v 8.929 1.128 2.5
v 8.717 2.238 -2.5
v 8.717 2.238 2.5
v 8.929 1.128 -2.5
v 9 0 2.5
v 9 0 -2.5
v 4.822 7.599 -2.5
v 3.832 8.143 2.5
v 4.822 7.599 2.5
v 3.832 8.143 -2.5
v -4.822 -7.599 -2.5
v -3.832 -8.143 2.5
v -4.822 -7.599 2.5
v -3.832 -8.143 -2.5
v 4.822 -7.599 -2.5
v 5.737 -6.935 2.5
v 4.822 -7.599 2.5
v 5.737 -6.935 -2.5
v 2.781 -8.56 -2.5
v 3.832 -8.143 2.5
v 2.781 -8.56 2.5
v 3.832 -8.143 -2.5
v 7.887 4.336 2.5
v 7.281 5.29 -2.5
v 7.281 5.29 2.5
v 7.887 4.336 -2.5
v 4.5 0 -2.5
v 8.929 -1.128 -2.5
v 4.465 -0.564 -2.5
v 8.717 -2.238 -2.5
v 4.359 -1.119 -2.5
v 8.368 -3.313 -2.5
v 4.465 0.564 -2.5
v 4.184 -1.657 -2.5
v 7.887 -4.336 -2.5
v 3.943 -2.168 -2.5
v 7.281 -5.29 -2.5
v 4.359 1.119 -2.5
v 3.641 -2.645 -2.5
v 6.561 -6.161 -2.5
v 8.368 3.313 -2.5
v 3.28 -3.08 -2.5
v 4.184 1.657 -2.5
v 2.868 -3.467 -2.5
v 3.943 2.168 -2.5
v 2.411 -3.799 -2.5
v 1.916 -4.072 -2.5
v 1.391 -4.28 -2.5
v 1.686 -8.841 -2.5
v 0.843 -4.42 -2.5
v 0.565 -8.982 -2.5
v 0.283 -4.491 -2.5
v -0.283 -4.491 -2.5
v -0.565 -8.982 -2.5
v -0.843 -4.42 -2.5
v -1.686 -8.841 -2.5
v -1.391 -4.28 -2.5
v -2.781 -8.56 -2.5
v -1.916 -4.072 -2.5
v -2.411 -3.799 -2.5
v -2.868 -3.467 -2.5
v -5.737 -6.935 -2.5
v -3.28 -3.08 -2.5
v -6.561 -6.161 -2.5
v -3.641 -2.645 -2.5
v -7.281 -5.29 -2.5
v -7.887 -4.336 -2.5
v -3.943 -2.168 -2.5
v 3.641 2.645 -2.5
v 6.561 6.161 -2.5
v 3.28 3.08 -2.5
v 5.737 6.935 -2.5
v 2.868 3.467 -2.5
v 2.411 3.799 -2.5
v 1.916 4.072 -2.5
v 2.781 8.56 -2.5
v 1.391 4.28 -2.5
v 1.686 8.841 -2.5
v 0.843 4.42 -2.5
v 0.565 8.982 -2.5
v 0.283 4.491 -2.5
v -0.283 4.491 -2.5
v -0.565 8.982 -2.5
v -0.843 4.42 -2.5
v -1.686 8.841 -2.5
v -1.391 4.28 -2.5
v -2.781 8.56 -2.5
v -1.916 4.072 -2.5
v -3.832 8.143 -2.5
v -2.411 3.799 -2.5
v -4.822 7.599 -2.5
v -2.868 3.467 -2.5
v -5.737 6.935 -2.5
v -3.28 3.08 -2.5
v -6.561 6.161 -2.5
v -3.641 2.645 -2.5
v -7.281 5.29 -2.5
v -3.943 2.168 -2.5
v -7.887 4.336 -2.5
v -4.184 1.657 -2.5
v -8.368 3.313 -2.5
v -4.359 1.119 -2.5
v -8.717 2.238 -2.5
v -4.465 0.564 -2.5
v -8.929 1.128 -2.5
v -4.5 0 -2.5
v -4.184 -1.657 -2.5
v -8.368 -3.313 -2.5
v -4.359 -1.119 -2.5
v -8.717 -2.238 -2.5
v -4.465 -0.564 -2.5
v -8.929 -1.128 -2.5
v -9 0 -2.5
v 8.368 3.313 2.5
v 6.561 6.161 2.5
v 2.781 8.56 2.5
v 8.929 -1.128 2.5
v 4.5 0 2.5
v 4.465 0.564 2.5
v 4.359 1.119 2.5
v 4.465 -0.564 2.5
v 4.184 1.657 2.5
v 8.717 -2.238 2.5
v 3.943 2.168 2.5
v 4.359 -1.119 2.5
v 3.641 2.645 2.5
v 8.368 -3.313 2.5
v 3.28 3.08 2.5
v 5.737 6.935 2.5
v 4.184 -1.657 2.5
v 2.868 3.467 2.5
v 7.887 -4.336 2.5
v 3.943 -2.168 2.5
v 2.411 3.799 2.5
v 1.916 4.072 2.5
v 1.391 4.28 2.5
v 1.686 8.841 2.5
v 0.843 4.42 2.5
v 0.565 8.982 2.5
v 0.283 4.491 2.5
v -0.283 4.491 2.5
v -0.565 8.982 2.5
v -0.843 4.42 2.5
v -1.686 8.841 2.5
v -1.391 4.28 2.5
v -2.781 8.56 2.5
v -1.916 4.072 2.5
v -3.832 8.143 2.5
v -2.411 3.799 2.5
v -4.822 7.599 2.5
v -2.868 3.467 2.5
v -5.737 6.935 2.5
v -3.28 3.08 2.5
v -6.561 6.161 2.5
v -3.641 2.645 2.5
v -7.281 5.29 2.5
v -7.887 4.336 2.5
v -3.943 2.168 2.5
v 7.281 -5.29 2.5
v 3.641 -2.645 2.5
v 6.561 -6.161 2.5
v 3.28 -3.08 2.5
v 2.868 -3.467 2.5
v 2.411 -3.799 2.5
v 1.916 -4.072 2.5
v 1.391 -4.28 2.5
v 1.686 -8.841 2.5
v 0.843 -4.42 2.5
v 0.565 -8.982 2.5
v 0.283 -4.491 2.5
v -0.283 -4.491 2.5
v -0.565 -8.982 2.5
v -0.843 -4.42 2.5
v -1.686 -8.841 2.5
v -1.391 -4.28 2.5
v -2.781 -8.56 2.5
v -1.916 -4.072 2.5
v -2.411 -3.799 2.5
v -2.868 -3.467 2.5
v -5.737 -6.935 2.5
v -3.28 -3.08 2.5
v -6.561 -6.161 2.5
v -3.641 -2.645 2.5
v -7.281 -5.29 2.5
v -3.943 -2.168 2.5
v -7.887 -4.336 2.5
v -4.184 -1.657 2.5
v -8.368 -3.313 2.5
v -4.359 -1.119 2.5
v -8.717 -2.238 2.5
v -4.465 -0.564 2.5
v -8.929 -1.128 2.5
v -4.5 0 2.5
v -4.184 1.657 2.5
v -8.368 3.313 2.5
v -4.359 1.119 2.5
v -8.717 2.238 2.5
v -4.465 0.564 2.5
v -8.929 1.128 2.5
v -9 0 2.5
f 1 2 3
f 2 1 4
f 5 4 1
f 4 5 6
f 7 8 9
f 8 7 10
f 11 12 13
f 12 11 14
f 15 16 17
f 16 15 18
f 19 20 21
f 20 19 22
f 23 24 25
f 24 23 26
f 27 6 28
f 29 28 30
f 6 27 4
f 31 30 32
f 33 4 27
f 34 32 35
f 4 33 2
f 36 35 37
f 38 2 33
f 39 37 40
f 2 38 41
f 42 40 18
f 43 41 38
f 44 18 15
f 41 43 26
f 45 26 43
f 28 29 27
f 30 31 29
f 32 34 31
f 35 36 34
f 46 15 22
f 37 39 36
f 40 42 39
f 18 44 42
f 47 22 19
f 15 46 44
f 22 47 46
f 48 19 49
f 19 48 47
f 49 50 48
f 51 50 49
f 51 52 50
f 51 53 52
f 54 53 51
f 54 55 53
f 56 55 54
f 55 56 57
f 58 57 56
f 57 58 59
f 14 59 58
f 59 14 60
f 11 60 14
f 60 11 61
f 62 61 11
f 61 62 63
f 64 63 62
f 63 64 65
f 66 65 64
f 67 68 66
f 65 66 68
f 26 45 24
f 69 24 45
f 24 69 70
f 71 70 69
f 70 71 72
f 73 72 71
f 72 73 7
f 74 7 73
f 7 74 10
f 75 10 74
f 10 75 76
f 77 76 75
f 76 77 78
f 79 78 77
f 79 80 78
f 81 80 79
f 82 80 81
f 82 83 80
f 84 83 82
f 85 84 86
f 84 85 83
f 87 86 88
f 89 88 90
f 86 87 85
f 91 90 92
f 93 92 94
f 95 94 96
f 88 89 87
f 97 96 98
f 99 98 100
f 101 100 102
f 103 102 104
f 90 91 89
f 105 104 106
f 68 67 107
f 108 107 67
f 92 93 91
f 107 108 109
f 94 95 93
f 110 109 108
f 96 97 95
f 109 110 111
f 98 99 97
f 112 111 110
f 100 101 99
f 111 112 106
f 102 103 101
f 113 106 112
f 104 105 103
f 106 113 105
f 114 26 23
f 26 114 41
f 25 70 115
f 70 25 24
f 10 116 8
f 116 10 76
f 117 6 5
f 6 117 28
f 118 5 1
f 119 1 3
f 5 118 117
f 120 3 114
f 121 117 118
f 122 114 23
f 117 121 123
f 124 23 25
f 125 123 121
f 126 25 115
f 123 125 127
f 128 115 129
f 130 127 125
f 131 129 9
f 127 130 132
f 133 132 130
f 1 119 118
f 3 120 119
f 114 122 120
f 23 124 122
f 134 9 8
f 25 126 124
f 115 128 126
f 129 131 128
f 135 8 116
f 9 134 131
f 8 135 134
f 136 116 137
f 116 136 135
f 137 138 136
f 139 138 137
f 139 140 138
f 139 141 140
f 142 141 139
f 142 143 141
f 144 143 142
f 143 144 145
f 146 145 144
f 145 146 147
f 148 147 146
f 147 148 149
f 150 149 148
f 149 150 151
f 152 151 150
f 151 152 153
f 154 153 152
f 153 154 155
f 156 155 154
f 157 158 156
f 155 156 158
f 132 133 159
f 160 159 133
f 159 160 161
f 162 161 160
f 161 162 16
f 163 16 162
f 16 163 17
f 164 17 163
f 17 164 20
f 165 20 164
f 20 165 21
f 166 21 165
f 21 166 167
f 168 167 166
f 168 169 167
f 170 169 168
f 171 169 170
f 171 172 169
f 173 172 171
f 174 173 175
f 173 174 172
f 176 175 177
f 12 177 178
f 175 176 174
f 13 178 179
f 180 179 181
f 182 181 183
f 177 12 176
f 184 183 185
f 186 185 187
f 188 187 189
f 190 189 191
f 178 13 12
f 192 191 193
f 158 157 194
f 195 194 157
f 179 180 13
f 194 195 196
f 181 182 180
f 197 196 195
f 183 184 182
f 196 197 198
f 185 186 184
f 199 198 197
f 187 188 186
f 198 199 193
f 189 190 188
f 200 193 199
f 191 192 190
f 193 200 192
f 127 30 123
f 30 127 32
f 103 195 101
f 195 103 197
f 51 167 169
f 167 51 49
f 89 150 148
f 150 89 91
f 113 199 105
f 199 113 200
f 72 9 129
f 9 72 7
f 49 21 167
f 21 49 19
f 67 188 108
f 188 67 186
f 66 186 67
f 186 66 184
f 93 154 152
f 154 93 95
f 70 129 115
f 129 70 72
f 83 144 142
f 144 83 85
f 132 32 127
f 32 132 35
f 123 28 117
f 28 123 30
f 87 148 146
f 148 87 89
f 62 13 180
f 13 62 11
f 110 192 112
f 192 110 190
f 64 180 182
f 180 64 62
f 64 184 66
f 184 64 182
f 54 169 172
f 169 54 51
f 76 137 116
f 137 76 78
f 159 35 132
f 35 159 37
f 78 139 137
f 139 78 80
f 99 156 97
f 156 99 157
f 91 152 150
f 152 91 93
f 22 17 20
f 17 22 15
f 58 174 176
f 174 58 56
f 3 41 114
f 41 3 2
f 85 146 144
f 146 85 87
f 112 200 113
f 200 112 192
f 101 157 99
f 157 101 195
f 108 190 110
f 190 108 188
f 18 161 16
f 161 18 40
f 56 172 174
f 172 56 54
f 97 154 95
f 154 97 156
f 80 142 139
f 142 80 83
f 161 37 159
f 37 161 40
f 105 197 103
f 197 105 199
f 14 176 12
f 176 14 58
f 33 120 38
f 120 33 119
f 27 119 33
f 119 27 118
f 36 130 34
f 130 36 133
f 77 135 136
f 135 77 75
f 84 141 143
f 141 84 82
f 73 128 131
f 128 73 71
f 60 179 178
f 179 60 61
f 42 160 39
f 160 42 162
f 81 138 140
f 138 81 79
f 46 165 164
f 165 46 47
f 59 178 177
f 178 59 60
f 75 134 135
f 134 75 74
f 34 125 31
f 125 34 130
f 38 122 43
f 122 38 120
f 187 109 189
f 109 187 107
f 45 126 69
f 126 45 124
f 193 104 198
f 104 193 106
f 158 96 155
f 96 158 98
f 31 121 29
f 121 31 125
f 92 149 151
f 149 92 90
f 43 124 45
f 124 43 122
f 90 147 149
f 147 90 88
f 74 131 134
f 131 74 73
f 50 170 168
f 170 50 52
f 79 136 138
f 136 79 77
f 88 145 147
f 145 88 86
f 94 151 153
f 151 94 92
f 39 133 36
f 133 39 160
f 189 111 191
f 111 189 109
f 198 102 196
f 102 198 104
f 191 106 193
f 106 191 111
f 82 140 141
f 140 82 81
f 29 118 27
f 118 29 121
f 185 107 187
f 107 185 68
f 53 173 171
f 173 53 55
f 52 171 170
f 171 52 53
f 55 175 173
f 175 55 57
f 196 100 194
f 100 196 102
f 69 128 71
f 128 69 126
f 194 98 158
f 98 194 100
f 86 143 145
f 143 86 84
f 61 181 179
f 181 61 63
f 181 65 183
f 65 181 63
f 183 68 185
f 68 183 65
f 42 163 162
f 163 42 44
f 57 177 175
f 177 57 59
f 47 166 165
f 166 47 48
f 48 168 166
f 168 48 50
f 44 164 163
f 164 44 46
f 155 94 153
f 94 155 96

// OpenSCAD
$fn = 50;


difference() {
	union() {
		translate(v = [0, 0, -2.5000000000]) {
			cylinder(h = 5, r = 9.0000000000);
		}
	}
	union() {
		translate(v = [0, 0, -100.0000000000]) {
			cylinder(h = 200, r = 4.5000000000);
		}
	}
}
